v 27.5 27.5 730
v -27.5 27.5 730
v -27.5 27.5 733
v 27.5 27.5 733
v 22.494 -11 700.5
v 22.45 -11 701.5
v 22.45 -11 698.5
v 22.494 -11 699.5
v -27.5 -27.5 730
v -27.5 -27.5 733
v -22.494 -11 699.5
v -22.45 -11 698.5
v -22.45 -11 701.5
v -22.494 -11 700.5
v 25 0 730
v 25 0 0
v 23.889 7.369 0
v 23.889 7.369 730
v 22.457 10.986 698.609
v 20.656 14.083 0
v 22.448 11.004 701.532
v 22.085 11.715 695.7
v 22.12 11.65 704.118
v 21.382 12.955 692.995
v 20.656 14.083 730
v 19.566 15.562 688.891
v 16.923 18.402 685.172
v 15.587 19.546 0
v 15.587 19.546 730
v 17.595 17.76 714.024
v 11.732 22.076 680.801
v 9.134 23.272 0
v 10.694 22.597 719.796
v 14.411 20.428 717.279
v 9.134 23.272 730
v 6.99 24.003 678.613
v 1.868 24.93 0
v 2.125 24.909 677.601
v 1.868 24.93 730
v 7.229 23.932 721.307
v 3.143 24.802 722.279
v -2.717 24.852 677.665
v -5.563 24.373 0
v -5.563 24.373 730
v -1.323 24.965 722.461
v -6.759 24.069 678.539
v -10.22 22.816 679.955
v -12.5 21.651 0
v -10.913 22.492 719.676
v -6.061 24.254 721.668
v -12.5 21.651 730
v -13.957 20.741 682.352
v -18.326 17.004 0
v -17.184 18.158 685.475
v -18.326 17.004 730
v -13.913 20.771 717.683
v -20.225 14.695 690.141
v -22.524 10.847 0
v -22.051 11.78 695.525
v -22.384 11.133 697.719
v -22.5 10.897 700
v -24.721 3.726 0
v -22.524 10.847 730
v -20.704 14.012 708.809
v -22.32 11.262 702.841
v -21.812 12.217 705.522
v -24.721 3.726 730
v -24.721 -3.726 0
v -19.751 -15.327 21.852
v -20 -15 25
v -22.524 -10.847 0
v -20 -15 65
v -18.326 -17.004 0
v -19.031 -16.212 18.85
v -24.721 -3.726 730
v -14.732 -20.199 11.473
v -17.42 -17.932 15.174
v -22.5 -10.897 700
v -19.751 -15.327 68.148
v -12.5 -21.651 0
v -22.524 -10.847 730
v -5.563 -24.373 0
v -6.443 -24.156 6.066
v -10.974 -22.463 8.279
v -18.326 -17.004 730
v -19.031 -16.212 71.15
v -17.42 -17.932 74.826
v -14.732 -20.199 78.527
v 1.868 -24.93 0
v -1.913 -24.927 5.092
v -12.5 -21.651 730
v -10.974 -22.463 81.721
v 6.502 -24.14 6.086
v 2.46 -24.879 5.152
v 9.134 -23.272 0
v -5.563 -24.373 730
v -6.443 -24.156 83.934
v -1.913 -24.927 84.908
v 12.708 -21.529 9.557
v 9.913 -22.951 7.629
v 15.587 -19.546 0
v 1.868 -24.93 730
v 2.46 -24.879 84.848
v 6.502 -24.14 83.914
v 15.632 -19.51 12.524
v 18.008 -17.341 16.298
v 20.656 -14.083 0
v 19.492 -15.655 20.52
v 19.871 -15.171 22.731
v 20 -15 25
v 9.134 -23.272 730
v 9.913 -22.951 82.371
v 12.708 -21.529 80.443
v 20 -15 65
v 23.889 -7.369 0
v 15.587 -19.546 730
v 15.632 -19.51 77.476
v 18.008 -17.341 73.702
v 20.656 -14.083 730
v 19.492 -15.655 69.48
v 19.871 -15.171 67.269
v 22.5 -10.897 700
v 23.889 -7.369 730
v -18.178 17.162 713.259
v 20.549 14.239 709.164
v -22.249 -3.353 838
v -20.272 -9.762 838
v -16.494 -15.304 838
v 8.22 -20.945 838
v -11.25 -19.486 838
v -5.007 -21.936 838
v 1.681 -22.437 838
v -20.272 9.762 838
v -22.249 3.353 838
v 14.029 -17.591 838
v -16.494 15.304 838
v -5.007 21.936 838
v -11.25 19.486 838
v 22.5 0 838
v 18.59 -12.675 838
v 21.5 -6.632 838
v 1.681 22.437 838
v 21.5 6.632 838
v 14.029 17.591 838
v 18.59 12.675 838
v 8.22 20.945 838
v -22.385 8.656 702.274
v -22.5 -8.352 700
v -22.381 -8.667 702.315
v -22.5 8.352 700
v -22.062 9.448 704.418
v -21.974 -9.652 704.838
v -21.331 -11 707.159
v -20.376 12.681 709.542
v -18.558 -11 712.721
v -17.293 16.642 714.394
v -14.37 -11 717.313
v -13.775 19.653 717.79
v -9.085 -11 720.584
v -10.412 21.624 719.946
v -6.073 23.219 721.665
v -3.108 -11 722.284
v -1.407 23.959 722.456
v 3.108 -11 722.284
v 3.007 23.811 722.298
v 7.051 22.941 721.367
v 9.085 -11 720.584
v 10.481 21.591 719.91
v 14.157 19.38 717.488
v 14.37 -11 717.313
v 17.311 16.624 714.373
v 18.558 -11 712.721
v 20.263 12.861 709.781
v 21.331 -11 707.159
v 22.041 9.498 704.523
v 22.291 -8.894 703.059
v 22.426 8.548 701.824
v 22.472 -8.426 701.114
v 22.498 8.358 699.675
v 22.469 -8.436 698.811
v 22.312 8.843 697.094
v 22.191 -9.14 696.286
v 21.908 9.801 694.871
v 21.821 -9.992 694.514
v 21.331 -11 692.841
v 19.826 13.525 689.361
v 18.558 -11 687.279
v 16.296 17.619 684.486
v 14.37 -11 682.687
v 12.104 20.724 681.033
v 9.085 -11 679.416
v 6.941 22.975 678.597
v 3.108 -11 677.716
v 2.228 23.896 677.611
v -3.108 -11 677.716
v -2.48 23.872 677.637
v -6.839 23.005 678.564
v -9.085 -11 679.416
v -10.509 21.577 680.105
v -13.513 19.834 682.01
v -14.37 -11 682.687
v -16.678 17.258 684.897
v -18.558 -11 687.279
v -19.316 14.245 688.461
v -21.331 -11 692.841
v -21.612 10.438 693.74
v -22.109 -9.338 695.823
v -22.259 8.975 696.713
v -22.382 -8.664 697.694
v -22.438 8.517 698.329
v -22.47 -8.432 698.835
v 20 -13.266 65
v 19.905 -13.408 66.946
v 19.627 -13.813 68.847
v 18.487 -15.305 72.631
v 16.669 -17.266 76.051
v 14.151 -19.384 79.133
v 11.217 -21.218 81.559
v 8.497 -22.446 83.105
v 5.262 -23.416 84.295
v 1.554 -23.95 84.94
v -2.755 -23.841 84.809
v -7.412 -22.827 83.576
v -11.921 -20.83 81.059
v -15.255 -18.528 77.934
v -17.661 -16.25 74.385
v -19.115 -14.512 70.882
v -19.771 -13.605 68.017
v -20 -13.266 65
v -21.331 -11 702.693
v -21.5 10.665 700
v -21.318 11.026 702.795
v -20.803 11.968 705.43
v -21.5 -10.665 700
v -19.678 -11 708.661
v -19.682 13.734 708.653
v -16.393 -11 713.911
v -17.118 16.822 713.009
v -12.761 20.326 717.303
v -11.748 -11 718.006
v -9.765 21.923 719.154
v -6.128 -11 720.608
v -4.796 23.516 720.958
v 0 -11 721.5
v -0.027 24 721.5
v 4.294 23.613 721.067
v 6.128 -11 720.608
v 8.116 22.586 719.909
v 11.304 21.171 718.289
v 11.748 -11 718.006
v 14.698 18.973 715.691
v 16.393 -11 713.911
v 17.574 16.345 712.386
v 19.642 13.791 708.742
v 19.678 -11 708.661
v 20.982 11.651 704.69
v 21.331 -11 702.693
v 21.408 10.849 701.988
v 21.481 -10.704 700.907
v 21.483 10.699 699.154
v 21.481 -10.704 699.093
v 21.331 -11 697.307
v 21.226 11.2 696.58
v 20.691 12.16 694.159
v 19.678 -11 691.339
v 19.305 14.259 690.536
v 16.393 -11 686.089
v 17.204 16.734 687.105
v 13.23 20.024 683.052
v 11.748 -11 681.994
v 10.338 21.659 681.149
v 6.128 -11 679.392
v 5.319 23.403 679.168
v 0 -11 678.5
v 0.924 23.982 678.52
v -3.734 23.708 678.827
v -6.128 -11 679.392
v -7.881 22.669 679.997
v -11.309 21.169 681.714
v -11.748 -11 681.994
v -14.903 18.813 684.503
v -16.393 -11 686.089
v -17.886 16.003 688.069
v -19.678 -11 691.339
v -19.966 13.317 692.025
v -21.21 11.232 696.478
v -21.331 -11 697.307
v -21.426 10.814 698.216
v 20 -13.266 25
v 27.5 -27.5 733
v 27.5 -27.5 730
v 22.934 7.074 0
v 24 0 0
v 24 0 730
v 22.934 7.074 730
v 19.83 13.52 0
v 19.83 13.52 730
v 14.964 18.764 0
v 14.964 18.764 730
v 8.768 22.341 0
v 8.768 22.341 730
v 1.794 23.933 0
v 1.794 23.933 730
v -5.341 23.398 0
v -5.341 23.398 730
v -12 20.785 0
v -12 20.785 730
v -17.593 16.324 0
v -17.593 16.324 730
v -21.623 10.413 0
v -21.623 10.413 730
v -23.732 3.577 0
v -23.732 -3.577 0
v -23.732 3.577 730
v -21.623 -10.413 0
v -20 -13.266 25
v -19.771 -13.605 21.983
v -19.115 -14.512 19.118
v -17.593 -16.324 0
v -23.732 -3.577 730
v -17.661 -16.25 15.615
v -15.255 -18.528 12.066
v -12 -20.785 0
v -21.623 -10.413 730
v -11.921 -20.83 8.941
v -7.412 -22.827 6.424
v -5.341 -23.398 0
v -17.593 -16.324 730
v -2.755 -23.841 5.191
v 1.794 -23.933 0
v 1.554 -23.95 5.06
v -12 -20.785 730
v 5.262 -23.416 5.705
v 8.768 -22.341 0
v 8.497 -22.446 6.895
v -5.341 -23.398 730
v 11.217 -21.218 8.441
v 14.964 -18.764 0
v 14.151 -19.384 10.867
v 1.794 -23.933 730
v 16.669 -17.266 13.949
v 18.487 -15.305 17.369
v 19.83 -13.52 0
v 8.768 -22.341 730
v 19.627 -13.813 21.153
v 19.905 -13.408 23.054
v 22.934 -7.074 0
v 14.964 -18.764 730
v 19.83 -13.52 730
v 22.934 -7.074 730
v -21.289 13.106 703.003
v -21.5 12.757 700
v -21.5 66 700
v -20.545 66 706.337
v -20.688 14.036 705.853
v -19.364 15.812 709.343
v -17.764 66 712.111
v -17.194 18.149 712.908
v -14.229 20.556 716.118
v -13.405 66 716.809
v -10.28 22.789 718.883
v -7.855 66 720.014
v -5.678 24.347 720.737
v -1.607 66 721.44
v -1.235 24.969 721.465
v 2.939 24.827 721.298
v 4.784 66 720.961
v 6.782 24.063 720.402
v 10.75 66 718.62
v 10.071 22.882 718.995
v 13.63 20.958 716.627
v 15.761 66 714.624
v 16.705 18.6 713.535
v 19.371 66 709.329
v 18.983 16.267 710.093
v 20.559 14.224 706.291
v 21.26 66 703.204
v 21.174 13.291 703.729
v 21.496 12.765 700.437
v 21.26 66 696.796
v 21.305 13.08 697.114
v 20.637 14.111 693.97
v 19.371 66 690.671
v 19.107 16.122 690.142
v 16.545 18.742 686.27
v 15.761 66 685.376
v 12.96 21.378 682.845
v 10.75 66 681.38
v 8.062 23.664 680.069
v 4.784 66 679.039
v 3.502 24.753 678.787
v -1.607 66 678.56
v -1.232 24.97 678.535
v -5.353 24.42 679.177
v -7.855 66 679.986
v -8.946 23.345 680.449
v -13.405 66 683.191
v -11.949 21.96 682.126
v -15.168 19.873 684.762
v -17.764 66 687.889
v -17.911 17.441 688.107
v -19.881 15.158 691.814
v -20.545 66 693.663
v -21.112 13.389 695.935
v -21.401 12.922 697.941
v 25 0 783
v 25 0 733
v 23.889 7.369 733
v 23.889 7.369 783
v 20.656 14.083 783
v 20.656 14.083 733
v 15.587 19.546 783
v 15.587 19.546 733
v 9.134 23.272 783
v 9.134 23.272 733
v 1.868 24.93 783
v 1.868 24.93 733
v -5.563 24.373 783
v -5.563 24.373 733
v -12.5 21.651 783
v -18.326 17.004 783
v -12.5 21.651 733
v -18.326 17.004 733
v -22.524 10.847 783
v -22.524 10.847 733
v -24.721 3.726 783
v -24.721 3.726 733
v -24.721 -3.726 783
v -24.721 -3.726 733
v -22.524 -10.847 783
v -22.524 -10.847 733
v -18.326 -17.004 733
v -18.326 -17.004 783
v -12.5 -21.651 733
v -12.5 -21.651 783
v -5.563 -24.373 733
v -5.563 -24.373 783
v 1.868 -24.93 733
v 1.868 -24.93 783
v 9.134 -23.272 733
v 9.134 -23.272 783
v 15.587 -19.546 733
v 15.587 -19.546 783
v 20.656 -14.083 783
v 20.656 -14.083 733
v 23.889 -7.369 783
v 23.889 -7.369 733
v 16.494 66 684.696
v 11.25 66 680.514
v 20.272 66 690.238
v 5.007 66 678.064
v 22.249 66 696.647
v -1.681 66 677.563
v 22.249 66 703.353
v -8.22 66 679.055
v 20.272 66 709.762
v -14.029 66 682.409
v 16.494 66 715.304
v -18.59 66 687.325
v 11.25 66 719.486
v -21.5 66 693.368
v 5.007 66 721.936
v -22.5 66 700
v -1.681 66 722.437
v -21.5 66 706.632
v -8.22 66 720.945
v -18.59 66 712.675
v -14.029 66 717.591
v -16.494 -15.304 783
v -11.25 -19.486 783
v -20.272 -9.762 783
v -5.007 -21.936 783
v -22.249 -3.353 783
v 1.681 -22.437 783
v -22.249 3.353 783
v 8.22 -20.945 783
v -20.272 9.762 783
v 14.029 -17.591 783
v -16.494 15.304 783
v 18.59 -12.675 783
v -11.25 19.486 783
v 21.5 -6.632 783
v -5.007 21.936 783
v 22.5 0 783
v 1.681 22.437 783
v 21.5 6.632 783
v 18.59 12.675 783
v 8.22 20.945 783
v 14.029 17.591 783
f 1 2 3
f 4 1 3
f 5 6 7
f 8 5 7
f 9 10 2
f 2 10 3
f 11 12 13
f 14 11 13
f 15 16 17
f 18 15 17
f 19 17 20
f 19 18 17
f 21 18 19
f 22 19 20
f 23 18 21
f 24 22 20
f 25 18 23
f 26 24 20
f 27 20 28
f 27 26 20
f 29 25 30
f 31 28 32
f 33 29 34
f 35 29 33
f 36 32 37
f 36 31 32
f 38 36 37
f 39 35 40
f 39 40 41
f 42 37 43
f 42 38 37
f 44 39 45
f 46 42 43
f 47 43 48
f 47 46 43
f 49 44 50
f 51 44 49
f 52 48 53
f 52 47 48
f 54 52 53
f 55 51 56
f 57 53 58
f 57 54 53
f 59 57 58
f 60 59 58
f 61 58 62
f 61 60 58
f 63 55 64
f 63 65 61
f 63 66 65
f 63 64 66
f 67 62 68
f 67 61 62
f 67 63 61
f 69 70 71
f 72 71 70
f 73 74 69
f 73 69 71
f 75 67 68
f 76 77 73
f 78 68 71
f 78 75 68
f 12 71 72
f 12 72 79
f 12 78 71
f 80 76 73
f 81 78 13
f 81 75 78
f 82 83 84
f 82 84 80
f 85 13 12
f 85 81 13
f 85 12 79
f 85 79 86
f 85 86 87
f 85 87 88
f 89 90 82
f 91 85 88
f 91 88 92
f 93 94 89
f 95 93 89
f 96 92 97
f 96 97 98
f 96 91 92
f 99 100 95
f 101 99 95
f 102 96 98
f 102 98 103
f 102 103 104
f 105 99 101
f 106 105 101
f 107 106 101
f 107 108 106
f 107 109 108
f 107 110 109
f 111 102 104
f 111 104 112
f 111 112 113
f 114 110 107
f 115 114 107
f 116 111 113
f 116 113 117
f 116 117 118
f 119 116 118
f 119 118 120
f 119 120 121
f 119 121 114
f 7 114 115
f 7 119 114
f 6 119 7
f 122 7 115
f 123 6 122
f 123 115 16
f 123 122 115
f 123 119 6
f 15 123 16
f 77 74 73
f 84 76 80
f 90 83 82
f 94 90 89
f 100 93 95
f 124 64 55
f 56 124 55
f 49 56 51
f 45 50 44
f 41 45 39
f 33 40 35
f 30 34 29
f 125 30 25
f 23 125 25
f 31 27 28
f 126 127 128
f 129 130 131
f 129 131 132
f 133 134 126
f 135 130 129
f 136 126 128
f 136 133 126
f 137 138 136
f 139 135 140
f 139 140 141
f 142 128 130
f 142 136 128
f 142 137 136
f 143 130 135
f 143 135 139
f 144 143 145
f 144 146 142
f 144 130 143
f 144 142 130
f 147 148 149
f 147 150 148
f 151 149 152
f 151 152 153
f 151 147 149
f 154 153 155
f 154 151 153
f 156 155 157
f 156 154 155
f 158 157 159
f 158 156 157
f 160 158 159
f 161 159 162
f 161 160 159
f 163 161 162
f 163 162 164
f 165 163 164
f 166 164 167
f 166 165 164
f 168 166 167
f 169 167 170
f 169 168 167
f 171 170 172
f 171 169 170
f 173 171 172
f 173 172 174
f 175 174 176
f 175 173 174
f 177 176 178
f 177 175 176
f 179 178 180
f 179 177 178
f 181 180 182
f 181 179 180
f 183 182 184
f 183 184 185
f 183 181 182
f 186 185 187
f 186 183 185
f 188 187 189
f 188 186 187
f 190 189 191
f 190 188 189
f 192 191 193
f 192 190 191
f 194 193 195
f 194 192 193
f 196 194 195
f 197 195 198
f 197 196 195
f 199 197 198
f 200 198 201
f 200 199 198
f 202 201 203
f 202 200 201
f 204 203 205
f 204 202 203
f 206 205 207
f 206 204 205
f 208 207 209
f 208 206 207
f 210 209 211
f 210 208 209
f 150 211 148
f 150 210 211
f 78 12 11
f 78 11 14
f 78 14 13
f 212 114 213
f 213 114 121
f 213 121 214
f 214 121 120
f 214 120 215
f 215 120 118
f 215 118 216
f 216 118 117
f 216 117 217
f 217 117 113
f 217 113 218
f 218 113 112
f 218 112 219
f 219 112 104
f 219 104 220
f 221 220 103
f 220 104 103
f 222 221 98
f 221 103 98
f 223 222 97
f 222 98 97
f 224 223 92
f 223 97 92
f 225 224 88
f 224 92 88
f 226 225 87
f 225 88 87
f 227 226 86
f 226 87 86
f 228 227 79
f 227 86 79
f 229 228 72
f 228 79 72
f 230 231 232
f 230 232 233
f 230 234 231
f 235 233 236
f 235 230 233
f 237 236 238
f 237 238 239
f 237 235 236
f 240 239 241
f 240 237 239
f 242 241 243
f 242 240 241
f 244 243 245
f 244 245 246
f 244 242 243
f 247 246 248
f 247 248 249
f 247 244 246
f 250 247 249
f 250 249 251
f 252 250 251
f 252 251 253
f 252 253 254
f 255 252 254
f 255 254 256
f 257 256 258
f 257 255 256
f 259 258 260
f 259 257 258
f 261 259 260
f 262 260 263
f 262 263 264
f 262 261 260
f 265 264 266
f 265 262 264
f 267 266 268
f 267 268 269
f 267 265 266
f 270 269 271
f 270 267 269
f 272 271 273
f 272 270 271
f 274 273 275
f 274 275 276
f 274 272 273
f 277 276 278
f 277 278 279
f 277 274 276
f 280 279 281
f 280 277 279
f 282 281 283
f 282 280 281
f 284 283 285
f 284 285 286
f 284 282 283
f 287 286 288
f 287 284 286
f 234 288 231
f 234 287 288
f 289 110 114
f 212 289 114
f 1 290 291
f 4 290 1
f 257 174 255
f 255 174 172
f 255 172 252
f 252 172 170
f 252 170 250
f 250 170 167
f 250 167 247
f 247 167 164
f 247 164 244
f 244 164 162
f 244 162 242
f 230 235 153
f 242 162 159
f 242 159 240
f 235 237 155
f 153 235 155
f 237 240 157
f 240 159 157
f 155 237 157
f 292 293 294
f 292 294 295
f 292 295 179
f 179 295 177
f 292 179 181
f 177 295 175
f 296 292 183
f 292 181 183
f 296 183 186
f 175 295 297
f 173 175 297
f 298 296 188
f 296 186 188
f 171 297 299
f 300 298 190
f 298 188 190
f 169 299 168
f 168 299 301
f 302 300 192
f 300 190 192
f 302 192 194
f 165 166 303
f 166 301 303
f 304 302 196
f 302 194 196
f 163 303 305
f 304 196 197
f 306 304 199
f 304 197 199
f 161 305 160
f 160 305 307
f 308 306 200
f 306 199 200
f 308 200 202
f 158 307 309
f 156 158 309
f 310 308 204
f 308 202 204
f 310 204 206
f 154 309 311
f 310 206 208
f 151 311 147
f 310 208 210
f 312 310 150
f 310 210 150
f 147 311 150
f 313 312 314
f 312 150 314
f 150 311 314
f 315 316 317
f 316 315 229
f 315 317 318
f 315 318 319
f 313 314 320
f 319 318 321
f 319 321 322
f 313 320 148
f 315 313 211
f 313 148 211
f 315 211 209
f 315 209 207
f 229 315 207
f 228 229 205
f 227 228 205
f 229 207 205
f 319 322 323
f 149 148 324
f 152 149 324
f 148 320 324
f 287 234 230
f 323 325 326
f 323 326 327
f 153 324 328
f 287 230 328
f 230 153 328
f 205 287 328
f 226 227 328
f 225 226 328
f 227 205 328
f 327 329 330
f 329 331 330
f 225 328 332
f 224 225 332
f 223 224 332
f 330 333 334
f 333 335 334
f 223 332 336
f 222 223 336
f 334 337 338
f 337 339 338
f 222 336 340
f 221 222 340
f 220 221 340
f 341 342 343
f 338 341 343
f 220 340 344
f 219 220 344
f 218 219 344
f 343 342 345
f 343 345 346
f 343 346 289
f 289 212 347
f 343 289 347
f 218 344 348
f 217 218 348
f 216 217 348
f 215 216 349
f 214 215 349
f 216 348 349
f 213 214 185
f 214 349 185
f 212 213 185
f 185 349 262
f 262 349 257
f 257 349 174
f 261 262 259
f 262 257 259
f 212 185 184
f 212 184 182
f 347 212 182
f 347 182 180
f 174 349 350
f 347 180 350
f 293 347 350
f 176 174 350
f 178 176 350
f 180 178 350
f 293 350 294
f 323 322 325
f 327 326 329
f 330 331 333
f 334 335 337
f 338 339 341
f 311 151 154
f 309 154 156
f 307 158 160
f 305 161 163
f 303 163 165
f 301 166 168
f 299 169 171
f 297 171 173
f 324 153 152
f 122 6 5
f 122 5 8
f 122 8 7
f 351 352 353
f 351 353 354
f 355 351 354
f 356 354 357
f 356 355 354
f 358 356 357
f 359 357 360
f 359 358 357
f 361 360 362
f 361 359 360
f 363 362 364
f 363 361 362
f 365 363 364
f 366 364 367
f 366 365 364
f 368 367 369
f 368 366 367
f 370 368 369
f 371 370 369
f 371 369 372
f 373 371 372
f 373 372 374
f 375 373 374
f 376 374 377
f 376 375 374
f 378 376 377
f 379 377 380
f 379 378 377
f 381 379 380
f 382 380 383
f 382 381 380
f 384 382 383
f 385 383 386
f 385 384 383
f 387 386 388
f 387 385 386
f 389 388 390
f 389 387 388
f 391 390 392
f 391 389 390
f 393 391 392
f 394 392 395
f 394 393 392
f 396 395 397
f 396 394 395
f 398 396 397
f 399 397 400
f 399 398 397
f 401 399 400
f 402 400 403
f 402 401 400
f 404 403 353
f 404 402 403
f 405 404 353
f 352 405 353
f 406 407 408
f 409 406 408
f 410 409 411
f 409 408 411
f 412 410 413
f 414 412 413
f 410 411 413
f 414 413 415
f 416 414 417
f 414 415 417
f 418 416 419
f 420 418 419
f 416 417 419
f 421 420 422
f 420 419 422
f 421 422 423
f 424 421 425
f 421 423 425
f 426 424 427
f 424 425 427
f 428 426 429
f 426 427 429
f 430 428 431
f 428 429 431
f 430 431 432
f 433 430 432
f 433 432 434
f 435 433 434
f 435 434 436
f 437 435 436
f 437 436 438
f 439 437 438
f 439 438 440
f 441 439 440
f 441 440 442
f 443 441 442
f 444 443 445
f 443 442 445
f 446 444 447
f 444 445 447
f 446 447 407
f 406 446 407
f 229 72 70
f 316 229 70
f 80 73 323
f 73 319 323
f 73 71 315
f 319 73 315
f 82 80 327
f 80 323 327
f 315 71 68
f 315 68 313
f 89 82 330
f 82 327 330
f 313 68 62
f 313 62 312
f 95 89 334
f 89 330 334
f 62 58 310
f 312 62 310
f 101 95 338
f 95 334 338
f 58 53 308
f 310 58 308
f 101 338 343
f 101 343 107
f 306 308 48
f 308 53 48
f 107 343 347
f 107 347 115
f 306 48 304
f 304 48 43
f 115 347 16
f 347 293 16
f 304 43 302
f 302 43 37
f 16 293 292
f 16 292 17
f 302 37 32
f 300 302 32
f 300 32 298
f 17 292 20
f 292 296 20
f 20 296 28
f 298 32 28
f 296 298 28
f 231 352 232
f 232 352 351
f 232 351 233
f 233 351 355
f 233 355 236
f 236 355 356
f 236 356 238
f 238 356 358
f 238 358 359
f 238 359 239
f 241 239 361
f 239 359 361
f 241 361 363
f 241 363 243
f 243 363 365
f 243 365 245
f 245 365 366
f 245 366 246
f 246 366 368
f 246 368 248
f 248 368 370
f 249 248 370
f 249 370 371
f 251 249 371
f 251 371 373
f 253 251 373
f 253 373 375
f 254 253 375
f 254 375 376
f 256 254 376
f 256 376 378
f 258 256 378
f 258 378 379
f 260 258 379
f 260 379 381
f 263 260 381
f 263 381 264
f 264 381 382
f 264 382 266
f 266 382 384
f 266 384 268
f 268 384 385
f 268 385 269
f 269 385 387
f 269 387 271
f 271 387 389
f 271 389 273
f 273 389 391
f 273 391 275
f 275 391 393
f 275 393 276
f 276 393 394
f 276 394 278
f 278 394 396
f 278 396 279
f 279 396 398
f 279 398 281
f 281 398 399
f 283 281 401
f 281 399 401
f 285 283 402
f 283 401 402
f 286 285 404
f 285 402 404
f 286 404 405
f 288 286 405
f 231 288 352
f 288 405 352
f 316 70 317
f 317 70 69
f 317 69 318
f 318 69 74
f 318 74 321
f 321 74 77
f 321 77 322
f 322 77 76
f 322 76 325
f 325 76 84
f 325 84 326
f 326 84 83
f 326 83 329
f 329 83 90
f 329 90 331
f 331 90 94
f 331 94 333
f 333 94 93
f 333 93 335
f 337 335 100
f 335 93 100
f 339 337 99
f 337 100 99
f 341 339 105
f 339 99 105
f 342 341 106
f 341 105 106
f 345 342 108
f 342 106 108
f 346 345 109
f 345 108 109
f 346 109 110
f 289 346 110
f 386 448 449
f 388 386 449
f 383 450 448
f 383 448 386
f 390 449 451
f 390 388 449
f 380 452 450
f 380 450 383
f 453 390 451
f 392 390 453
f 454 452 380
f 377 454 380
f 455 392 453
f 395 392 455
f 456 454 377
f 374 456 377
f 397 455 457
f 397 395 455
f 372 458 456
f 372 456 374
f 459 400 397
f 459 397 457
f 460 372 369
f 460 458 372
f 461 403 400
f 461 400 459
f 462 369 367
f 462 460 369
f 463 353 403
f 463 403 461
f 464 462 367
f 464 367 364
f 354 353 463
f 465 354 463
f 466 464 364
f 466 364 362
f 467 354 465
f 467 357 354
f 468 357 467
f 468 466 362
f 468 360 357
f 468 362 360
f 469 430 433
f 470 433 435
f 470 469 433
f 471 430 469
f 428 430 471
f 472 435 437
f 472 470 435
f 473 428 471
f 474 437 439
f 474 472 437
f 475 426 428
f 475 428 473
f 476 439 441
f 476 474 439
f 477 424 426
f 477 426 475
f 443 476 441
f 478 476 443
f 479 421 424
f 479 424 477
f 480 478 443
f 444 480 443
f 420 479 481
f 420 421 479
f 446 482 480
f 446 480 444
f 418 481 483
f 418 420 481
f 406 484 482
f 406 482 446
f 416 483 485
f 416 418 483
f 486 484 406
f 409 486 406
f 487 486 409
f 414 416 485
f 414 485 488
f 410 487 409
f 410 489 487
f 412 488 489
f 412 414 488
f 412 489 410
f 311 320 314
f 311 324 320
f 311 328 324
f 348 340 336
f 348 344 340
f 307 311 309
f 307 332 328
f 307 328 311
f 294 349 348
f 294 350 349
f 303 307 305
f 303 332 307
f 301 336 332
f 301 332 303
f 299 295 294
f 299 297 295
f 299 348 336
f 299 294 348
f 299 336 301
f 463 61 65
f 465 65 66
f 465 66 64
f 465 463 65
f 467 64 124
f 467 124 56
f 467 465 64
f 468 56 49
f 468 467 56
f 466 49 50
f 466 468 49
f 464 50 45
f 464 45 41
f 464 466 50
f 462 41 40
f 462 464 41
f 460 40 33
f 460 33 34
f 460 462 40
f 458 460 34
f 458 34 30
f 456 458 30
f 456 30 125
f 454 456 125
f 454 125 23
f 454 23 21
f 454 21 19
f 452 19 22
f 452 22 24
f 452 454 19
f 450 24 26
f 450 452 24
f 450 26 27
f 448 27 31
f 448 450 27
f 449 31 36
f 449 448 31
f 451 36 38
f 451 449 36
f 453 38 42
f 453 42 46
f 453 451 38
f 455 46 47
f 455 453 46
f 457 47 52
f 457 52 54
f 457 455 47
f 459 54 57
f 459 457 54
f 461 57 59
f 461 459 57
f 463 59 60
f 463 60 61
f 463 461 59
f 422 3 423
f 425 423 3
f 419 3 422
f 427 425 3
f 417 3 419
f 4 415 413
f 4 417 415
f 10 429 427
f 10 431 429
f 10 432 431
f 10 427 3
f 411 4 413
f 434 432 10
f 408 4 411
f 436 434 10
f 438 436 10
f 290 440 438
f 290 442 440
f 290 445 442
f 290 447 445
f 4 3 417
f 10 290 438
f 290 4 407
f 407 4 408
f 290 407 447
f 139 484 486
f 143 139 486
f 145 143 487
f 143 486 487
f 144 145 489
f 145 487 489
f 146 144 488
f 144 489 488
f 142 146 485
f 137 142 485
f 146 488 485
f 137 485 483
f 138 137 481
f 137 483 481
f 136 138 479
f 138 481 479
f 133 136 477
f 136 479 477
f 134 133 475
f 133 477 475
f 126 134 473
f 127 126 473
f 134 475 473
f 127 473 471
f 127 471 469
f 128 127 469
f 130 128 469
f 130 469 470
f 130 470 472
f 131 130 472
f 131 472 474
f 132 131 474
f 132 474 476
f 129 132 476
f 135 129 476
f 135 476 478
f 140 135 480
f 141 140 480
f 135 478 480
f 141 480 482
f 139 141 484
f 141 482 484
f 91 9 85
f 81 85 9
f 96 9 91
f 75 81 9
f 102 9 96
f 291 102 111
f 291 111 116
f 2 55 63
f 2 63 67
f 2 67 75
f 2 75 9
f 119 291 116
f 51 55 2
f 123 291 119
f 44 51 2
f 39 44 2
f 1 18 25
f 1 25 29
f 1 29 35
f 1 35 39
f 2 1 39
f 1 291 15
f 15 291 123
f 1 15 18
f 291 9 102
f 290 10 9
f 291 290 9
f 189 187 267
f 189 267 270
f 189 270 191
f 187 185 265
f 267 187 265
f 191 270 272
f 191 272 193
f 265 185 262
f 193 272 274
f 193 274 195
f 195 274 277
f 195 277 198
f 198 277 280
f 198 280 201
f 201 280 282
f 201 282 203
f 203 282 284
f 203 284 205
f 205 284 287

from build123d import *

# Parameters (mm, degrees)
F1_R      = 25
F1_R_2    = 24
F4_DEPTH  = 27.5
F5_R      = 25
F6_DEPTH  = 50
F7_R      = 22.5
F8_DEPTH  = 55
F9_R      = 21.5
F10_DEPTH = 20
F9_R_2    = 22.5
F11_DEPTH = 38.5
F13_DEPTH = 38.5


with BuildPart() as f2:
    # F2: sweep along a path in F0
    with BuildLine(Plane.YZ) as f2_path:
        Line((0, 0), (0, 730))
    # F1 (on Top) → F2 (sweep)
    with BuildSketch(Plane.XY):
        Circle(F1_R)
        Circle(F1_R_2, mode=Mode.SUBTRACT)
    sweep(path=f2_path.line)

    # F3 (on Right) → F4 (join, symmetric)
    with BuildSketch(Plane.YZ):
        Polygon((-27.5, 730), (-25, 730), (25, 730), (27.5, 730), (27.5, 733), (-27.5, 733), align=None)
    extrude(amount=F4_DEPTH, both=True)

    # F5 (on face) → F6 (join)
    with BuildSketch(Plane.XY.offset(733)):
        Circle(F5_R)
    extrude(amount=F6_DEPTH)

    # F7 (on face) → F8 (join)
    with BuildSketch(Plane.XY.offset(783)):
        Circle(F7_R)
    extrude(amount=F8_DEPTH)

    # F9 (on face) → F10 (cut)
    with BuildSketch(Plane(origin=(0, 27.5, 0), x_dir=(-1, 0, 0), z_dir=(0, 1, 0))):
        with Locations((0, 700)):
            Circle(F9_R)
    extrude(amount=-F10_DEPTH, mode=Mode.SUBTRACT)

    # F9 (on face) → F11 (join, symmetric)
    with BuildSketch(Plane(origin=(0, 27.5, 0), x_dir=(-1, 0, 0), z_dir=(0, 1, 0))):
        with Locations((0, 700)):
            Circle(F9_R_2)
        with Locations((0, 700)):
            Circle(F9_R, mode=Mode.SUBTRACT)
    extrude(amount=F11_DEPTH, both=True)

    # F12 (on face) → F13 (cut)
    with BuildSketch(Plane.XZ.offset(27.5)):
        with BuildLine():
            Line((-20, 65), (-20, 25))
            ThreePointArc((-20, 25), (0, 5), (20, 25))
            Line((20, 25), (20, 65))
            ThreePointArc((20, 65), (0, 85), (-20, 65))
        make_face()
    extrude(amount=-F13_DEPTH, mode=Mode.SUBTRACT)


solid = f2.part
